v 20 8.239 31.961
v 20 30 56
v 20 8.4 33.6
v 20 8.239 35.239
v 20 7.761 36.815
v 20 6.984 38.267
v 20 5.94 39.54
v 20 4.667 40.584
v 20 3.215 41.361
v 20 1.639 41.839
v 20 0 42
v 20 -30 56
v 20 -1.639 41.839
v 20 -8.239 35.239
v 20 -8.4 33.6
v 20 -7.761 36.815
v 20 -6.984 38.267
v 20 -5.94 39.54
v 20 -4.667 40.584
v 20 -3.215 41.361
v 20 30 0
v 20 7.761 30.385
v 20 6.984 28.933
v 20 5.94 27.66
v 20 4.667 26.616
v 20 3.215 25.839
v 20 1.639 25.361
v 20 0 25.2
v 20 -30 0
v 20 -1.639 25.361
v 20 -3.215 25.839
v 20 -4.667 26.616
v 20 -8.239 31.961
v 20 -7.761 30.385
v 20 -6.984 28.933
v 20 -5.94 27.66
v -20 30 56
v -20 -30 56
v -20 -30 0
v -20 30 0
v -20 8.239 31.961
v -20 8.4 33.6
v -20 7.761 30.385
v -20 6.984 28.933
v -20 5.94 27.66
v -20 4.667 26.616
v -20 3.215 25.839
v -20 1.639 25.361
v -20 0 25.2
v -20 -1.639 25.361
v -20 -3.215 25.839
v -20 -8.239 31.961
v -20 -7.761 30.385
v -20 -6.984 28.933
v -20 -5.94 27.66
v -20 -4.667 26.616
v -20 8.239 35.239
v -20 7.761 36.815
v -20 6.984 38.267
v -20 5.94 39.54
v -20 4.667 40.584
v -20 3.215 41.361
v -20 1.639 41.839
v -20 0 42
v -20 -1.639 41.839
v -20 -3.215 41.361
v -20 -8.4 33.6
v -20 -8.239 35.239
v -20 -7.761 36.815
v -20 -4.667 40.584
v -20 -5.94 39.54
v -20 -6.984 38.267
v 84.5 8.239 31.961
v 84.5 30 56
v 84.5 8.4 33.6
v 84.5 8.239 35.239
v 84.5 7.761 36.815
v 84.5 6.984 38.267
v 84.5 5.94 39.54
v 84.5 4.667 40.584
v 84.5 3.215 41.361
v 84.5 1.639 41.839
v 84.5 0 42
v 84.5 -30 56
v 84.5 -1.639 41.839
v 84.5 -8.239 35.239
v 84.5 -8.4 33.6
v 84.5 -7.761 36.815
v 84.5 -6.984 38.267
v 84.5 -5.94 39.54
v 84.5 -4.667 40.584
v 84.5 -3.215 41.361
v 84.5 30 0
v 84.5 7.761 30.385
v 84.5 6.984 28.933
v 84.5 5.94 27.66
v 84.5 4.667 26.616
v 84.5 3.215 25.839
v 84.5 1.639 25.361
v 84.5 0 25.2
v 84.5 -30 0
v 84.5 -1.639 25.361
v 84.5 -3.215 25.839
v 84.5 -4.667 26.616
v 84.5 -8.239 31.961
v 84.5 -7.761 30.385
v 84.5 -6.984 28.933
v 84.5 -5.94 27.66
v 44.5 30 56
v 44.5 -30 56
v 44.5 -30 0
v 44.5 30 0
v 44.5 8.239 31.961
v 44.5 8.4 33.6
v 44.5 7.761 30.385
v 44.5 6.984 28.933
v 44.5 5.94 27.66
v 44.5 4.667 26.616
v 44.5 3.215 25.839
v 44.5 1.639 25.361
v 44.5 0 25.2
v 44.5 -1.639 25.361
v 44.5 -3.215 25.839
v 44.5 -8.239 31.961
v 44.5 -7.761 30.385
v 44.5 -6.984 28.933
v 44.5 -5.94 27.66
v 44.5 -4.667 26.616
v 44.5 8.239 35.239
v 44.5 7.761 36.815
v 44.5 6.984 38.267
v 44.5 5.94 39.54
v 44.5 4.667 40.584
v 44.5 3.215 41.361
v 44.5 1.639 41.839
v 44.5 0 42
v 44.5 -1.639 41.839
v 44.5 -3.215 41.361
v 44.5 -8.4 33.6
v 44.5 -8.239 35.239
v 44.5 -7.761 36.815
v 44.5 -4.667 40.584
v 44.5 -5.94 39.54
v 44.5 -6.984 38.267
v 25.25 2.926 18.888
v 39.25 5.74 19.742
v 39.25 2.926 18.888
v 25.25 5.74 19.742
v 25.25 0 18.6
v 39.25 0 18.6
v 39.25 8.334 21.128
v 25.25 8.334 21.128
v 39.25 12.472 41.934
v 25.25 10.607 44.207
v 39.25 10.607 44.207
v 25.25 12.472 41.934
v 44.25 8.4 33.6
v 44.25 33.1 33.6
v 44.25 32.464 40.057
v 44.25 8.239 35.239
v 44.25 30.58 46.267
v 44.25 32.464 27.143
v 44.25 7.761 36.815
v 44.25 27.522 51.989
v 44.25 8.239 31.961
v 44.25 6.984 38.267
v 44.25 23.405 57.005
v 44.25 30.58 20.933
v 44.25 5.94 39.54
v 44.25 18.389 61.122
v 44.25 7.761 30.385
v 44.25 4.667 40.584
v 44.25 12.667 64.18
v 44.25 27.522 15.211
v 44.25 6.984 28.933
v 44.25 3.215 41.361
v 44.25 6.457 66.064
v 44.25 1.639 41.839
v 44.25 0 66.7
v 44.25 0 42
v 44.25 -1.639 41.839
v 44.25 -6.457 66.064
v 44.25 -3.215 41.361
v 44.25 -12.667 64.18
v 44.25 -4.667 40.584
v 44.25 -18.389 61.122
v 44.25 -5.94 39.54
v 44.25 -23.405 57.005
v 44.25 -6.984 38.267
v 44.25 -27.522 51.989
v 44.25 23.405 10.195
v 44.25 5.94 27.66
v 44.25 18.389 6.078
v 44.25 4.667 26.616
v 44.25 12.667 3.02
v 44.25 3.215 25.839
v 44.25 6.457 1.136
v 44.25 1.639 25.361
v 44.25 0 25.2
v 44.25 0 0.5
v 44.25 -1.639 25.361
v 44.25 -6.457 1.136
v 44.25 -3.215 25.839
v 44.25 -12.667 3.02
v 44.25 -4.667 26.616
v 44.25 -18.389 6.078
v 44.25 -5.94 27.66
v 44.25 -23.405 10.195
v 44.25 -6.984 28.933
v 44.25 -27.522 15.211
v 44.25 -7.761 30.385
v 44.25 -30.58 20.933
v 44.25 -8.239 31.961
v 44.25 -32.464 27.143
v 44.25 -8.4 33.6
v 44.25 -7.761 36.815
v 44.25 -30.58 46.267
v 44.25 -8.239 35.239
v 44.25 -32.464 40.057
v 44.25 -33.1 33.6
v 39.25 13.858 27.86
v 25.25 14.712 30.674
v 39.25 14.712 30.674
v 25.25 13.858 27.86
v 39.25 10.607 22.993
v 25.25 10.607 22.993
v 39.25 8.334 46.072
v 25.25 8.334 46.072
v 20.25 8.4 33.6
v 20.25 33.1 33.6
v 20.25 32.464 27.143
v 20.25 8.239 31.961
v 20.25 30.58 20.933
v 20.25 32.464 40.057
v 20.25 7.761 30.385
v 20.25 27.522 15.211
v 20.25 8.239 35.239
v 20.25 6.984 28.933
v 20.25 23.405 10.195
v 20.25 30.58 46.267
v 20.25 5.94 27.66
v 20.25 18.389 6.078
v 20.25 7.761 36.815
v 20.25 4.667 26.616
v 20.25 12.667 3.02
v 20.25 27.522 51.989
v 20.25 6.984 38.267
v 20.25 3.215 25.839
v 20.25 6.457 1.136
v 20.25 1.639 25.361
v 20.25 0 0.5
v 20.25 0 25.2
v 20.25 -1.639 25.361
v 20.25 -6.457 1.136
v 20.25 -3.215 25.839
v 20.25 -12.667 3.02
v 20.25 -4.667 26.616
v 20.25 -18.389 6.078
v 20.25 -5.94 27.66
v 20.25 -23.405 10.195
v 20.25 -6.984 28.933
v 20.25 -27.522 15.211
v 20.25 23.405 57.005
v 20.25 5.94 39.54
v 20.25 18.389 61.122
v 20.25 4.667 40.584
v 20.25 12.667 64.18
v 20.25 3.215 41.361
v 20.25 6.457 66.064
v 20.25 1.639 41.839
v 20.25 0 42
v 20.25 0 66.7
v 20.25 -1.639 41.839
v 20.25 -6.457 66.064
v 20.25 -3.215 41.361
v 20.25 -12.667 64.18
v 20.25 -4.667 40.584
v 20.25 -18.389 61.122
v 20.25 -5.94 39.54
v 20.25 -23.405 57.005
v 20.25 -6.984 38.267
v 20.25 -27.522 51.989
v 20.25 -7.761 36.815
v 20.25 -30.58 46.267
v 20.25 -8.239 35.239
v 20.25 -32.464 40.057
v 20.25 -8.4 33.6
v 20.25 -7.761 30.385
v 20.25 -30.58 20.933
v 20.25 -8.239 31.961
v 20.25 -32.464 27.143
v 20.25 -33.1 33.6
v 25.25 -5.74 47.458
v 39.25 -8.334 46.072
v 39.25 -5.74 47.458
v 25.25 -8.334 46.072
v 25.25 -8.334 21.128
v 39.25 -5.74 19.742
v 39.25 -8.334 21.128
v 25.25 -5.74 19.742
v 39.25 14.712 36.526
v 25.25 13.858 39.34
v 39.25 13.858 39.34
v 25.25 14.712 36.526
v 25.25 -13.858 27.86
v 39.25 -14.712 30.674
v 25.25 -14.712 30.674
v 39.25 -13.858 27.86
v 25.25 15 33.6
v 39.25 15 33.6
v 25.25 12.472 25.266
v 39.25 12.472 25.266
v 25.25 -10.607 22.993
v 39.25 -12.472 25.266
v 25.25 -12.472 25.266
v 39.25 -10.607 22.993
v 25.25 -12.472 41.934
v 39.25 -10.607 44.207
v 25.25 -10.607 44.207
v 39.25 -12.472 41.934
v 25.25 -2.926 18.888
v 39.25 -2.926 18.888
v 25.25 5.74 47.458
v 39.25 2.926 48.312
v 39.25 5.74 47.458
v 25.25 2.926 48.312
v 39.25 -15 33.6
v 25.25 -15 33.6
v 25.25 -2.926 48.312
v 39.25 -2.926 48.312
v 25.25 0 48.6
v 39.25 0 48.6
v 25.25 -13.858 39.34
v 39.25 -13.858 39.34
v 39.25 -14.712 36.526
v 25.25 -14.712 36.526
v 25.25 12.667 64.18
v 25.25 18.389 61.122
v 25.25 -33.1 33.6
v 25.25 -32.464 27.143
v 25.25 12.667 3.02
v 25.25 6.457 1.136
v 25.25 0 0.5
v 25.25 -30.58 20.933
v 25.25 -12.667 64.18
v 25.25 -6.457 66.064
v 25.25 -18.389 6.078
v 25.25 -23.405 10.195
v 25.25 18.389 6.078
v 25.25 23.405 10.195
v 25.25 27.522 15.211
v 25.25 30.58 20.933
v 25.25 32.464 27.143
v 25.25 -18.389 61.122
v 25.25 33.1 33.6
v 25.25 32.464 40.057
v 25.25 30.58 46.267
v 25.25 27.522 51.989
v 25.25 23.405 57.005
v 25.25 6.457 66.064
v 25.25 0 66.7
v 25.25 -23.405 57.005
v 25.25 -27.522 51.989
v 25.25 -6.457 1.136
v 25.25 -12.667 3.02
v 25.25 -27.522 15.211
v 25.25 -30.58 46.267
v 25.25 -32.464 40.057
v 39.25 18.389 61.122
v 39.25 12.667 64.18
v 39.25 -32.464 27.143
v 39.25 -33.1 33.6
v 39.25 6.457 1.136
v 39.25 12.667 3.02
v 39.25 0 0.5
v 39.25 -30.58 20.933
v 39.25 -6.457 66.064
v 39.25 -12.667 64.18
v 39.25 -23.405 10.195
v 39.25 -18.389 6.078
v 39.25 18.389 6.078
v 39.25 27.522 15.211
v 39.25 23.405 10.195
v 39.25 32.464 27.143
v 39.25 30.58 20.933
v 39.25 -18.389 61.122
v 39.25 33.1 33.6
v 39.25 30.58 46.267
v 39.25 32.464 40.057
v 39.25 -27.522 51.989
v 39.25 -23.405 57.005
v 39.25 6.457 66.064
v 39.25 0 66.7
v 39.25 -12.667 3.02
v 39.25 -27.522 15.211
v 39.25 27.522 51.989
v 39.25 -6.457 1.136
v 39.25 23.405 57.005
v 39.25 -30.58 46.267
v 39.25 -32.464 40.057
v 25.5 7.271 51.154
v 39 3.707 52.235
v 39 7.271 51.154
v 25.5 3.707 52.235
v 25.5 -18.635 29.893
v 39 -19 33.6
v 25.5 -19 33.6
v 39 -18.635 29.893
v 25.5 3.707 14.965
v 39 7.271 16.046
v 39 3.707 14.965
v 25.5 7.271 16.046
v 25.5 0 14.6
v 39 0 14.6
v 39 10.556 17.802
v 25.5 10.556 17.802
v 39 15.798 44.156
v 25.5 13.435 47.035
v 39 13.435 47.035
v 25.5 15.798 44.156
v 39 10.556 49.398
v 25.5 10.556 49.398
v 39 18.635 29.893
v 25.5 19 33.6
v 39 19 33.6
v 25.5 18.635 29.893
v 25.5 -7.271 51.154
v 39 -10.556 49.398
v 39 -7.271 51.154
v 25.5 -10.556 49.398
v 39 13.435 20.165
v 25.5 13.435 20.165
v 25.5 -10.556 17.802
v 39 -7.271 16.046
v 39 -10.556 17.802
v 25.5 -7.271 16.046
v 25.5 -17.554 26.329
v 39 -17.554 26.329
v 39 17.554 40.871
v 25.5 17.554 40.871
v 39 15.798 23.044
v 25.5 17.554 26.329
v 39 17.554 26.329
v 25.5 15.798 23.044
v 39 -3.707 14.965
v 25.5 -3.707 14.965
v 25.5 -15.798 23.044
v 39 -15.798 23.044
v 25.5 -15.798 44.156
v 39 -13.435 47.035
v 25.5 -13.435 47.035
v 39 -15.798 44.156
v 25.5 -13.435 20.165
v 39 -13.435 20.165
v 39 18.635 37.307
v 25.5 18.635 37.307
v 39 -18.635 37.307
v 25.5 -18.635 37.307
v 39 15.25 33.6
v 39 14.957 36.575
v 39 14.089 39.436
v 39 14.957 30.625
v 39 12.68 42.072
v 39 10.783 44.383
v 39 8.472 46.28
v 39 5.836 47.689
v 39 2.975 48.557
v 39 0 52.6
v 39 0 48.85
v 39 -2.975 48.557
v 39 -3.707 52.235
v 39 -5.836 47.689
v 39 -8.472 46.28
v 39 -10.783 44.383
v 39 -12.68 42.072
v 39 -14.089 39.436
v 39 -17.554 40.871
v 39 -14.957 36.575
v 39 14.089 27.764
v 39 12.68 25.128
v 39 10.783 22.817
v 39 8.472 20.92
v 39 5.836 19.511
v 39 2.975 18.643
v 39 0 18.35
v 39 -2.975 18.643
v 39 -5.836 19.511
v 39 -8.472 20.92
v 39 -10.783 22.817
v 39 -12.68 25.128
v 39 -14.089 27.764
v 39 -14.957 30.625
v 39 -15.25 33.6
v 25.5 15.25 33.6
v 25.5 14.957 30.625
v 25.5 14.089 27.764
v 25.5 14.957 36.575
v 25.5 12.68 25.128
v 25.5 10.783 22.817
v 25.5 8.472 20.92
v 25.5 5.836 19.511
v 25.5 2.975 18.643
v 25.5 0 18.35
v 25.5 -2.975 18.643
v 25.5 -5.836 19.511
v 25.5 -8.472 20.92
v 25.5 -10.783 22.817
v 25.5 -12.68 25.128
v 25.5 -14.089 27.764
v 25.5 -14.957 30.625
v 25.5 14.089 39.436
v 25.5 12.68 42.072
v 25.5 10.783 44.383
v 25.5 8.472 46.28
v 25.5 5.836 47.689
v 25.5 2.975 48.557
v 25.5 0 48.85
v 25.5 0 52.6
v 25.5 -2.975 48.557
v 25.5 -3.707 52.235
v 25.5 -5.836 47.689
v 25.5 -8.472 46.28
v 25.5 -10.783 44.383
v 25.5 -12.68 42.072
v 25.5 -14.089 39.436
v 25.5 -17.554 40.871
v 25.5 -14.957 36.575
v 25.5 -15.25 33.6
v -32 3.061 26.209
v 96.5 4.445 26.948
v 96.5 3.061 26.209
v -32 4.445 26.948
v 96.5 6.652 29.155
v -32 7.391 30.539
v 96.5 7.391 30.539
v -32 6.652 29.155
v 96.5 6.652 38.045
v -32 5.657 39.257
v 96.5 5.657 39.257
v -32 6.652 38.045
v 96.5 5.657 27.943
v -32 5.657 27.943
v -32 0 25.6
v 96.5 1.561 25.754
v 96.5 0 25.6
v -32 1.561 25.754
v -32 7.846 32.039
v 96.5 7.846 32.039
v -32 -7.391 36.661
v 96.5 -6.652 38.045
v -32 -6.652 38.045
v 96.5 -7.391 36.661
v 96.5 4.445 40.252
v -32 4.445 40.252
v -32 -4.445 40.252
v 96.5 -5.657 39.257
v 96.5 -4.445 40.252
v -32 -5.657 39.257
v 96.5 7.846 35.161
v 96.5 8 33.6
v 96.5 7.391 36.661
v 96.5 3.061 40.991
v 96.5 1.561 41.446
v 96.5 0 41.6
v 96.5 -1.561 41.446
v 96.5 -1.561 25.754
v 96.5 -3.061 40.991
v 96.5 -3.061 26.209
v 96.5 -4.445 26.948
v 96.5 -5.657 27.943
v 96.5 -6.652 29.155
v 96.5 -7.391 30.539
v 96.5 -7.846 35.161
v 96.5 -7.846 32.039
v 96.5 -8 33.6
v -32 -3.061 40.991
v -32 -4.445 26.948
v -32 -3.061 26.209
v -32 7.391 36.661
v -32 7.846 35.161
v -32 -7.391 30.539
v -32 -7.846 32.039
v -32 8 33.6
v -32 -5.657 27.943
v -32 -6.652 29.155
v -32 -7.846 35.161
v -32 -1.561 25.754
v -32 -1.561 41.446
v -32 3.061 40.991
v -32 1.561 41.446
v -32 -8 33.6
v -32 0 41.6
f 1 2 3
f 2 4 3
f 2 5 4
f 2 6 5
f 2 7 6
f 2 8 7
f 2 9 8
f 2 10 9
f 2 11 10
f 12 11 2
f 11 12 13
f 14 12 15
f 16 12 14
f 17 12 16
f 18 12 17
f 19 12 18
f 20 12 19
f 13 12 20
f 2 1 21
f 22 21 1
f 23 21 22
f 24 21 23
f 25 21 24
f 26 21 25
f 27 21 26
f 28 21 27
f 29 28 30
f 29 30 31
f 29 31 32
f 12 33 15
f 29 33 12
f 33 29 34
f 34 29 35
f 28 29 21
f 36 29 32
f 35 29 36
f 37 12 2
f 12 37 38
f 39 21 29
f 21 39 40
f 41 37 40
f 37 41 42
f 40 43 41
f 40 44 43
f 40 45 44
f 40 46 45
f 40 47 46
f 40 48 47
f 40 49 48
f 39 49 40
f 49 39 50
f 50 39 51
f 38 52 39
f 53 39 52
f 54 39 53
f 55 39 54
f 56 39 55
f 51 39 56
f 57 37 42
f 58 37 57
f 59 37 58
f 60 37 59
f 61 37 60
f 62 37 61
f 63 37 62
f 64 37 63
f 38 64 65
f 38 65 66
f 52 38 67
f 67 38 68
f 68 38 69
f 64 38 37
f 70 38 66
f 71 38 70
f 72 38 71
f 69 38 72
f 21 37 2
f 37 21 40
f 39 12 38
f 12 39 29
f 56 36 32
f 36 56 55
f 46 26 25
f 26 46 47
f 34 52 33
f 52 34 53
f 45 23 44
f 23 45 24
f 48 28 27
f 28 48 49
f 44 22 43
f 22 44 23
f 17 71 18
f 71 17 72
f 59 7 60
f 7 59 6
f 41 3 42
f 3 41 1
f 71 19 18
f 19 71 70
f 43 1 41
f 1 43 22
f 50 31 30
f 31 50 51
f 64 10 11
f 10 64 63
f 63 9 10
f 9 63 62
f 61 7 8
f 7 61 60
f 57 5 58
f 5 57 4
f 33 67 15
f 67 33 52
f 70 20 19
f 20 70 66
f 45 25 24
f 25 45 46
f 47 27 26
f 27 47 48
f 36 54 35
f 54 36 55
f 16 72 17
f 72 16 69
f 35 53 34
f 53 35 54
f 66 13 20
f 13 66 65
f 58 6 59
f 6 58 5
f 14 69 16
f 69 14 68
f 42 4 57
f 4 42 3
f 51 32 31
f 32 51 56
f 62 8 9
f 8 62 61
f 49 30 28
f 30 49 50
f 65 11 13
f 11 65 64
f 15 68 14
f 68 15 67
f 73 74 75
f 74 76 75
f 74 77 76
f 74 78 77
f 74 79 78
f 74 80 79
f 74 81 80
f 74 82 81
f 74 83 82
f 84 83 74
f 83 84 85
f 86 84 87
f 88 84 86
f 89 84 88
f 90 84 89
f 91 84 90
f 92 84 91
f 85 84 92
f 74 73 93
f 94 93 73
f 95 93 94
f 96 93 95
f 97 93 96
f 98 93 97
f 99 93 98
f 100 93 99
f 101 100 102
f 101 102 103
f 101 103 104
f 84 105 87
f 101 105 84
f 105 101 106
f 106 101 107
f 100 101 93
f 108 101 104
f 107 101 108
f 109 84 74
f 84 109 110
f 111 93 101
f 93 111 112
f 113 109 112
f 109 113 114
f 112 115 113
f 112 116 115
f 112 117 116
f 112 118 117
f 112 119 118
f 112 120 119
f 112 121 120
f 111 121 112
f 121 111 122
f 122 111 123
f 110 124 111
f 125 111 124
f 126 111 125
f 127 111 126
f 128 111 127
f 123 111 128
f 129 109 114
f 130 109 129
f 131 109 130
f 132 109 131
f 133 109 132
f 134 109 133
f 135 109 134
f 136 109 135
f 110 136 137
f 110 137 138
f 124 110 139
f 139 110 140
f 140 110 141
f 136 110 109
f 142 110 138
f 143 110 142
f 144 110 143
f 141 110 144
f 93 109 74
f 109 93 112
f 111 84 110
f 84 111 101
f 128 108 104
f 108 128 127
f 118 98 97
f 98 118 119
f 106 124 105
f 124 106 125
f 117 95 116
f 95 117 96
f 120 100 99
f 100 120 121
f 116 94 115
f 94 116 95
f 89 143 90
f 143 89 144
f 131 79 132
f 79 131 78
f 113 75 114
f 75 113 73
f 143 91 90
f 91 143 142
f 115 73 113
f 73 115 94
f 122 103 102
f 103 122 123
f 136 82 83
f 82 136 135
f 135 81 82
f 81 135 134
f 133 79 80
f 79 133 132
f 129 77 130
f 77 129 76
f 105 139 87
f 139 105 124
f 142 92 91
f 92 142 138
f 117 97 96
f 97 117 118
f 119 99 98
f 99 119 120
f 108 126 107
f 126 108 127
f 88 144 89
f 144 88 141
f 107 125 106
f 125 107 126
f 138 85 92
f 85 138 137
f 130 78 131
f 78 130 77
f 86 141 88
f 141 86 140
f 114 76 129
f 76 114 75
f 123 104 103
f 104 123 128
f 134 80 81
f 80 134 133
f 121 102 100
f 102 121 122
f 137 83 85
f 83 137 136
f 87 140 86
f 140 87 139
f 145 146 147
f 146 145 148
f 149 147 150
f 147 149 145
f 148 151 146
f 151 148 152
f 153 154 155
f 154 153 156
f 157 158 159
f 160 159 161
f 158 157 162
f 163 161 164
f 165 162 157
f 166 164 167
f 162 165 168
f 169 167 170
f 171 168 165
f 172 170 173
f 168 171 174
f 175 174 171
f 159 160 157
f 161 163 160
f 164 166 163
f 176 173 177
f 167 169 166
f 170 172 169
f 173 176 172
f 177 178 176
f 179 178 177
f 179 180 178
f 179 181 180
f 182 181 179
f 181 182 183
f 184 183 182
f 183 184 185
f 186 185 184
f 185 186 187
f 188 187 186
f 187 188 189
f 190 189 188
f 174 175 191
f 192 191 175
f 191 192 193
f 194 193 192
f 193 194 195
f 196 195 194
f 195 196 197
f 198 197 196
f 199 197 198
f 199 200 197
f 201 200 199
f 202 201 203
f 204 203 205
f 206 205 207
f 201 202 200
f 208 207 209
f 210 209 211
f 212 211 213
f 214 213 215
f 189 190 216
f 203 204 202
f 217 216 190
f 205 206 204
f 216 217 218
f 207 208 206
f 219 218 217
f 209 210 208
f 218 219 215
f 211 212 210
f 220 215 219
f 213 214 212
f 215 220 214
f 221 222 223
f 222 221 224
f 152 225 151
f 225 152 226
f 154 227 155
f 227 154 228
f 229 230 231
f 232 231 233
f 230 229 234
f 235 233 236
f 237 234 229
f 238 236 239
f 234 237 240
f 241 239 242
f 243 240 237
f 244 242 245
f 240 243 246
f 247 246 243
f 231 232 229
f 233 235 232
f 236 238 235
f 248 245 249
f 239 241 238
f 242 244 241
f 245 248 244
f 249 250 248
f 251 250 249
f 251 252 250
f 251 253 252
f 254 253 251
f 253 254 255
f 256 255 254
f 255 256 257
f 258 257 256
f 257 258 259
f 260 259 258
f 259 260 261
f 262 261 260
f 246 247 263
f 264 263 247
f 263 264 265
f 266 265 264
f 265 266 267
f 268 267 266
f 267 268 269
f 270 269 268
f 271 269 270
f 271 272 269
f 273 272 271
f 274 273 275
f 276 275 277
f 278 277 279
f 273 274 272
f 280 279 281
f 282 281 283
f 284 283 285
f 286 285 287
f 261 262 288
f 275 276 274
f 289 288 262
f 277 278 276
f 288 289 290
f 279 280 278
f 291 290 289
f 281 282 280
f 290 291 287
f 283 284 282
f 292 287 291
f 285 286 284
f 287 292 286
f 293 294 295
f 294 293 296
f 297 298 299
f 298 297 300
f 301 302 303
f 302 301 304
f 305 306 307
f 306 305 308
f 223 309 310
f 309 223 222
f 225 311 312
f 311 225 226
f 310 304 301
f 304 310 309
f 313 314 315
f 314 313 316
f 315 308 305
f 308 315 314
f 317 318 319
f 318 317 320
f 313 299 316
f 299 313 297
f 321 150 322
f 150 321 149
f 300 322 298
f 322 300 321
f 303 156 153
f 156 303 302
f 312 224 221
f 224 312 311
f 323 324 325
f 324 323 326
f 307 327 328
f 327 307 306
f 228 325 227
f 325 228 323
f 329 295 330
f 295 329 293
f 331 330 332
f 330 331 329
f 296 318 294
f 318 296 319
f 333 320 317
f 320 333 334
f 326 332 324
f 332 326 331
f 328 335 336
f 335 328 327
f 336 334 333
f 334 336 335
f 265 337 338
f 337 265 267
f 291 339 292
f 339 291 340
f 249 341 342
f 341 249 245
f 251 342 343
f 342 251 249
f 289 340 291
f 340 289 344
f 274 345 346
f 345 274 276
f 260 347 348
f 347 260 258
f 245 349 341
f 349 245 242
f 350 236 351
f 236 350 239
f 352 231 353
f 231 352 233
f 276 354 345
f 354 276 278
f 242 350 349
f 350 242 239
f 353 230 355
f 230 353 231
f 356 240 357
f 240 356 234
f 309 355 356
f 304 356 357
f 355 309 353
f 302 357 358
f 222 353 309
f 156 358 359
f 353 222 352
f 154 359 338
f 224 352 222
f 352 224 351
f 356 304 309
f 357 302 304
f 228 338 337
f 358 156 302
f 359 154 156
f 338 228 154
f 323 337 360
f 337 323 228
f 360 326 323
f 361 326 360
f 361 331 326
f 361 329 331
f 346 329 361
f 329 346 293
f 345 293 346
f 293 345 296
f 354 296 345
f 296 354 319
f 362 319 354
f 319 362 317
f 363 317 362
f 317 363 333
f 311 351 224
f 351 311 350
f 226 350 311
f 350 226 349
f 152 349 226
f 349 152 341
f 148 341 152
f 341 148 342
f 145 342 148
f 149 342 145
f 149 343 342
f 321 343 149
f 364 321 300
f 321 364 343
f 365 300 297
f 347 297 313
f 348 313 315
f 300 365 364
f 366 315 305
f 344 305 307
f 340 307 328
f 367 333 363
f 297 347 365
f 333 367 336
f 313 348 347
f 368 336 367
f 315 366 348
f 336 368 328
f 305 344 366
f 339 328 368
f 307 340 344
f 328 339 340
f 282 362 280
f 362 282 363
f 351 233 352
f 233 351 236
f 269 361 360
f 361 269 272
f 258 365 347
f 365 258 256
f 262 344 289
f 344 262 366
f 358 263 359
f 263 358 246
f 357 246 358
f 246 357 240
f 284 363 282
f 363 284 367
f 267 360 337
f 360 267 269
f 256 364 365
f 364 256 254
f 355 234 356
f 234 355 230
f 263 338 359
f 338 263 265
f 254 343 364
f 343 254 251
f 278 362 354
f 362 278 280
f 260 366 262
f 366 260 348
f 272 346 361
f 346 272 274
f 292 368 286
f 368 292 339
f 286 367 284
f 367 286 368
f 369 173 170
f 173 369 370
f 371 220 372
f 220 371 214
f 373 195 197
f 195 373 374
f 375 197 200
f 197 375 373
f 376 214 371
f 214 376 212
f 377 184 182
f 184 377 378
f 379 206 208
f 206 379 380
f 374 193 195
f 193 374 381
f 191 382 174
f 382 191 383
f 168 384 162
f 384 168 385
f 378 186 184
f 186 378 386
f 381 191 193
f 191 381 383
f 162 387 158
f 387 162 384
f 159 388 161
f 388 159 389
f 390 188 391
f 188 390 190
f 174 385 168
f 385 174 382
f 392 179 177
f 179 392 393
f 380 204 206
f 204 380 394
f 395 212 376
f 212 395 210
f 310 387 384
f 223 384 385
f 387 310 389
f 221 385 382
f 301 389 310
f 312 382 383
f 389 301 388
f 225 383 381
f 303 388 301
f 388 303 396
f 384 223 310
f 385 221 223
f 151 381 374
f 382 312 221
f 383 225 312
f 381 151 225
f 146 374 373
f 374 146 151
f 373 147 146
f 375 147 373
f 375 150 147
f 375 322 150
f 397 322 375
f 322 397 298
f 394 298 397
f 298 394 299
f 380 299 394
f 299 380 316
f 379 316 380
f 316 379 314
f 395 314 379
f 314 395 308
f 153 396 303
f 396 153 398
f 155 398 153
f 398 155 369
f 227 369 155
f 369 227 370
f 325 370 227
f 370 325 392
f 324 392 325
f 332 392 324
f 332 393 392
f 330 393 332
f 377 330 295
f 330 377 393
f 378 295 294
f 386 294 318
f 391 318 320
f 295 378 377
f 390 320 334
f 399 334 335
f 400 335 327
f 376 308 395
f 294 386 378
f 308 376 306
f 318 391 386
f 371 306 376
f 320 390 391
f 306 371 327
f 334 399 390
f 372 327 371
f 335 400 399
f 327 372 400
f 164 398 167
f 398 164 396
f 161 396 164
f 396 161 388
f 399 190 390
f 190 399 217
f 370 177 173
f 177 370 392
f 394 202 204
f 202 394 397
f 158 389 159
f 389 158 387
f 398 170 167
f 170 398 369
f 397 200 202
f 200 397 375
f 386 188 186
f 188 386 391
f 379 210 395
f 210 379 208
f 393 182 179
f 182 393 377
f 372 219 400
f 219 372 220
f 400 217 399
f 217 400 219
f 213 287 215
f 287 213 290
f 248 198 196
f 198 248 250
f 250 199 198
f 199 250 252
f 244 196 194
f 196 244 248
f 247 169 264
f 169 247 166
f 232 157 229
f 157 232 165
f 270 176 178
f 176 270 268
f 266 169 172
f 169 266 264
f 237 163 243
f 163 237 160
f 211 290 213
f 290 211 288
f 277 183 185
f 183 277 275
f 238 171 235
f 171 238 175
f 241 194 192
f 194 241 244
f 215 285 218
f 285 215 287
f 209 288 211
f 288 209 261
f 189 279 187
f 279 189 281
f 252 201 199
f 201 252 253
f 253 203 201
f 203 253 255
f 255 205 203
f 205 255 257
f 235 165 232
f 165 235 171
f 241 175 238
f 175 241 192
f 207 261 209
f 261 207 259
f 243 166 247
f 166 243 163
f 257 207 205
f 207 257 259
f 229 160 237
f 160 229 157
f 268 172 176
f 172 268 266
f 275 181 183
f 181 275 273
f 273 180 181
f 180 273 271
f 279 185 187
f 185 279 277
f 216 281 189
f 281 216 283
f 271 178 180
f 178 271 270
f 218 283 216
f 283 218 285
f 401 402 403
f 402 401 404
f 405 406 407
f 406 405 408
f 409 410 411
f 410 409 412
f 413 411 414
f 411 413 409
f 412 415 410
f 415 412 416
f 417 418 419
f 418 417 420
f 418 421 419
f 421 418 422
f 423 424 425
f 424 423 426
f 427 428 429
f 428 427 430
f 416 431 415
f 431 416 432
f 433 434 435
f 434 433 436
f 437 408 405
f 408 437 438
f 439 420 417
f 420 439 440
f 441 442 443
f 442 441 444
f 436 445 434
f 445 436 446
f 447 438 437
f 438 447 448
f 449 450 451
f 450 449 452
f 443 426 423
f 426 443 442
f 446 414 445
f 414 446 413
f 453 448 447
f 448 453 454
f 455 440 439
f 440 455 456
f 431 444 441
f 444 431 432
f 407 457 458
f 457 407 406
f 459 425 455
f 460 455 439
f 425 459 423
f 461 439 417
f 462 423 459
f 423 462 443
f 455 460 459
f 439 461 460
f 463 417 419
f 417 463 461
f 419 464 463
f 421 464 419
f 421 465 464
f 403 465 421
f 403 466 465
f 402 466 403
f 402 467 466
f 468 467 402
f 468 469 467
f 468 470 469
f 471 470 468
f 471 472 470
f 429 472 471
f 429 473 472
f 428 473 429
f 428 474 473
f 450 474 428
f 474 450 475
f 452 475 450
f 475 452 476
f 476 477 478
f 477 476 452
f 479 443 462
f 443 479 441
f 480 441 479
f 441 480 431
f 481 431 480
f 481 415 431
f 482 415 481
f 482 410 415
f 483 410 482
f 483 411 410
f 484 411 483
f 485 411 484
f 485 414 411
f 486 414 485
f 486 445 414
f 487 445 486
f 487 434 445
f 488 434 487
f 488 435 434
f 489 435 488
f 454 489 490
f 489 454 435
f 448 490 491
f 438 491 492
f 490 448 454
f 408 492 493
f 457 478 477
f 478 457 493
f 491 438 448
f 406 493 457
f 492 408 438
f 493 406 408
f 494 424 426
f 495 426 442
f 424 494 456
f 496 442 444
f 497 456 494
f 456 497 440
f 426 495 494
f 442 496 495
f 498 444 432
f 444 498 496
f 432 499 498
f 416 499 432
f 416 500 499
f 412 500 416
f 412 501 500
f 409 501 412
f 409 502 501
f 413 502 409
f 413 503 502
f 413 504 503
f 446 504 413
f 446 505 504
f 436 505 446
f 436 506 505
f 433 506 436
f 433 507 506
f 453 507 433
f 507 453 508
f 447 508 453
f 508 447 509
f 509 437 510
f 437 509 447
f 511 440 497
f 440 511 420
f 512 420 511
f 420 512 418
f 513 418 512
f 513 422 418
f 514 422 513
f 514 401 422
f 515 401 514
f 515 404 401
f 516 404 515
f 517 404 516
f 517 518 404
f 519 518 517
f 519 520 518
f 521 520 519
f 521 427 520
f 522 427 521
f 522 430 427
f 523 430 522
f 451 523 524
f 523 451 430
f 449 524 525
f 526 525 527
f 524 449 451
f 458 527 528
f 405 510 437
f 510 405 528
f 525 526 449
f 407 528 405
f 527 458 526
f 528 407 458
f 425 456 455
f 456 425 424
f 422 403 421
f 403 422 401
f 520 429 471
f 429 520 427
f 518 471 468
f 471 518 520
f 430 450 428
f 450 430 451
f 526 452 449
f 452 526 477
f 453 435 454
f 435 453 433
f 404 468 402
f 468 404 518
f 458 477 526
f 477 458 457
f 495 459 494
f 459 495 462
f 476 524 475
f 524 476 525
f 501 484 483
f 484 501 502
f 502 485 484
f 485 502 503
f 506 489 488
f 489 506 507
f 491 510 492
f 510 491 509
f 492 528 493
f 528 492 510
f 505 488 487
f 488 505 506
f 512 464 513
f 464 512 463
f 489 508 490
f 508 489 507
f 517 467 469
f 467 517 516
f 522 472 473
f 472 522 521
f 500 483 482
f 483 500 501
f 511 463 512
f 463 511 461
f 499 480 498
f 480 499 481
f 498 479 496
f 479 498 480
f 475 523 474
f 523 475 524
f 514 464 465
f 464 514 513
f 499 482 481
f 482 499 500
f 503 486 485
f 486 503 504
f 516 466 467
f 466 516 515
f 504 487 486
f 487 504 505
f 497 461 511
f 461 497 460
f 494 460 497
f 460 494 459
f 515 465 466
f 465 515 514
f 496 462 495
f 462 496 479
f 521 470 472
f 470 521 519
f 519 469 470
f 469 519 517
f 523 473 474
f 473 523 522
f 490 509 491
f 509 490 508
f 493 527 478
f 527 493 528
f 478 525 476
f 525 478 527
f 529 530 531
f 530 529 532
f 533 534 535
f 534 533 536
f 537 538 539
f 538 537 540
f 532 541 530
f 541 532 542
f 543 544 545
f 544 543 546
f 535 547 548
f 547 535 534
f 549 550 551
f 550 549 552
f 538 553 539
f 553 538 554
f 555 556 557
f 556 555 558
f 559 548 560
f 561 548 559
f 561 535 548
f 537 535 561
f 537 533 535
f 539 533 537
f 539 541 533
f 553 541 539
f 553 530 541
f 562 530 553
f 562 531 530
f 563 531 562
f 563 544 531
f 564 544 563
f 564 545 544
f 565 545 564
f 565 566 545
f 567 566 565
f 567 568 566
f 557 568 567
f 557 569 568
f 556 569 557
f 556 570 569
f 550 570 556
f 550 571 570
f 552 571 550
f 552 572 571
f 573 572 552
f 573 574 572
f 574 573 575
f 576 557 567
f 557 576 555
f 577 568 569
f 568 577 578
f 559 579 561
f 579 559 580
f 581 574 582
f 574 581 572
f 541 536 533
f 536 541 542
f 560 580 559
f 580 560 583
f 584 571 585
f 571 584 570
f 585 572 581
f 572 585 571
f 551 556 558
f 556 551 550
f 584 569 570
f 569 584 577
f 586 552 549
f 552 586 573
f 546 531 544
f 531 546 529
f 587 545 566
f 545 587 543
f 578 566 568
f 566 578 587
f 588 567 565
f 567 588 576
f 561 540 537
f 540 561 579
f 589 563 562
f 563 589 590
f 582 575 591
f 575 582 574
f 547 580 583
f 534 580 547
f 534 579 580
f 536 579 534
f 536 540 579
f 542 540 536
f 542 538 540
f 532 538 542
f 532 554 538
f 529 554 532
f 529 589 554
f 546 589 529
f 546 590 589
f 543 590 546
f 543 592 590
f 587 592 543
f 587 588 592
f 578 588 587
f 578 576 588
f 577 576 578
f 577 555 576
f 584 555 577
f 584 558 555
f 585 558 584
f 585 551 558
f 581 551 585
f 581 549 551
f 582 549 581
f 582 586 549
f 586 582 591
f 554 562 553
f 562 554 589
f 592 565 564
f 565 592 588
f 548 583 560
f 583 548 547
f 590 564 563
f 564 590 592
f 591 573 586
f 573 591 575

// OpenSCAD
$fn = 32;

// ------------------------------------------------------------------------
// Pulley assembly: d66.2 pulley with a belt, shaft d16
// Every part is its own module, assembly() places them once.
// ------------------------------------------------------------------------

// --- part 1 ---
module support1() {
  difference() {
    translate([-20, -30, 0]) cube([40, 60, 56]);
    translate([0, 0, 33.6]) rotate([0, 90, 0]) cylinder(h = 42, d = 16.8, center = true);
  }
}

// --- part 2 ---
module support2() {
  difference() {
    translate([-20, -30, 0]) cube([40, 60, 56]);
    translate([0, 0, 33.6]) rotate([0, 90, 0]) cylinder(h = 42, d = 16.8, center = true);
  }
}

// --- part 3 ---
module shaft() {
  translate([0, 0, -64.25]) cylinder(h = 128.5, d = 16);
}

// --- part 4 ---
module pulley() {
  difference() {
    union() {
      cylinder(h = 24, d = 30);
      cylinder(h = 5, d = 66.2);
      translate([0, 0, 19]) cylinder(h = 5, d = 66.2);
    }
    translate([0, 0, -1]) cylinder(h = 26, d = 16.8);
  }
}

// --- part 5 ---
module belt() {
  difference() {
      translate([0, 0, 0]) cylinder(h = 13.5, d = 38);
      translate([0, 0, -1]) cylinder(h = 15.5, d = 30.5);
    }
}

// --- assembly ---
module assembly() {
  translate([0, 0, 0]) rotate([0, 0, 0]) support1();
  translate([64.5, 0, 0]) rotate([0, 0, 0]) support2();
  translate([32.25, 0, 33.6]) rotate([0, 90, 0]) shaft();
  translate([20.25, 0, 33.6]) rotate([0, 90, 0]) pulley();
  translate([25.5, 0, 33.6]) rotate([0, 90, 0]) belt();
}

assembly();
